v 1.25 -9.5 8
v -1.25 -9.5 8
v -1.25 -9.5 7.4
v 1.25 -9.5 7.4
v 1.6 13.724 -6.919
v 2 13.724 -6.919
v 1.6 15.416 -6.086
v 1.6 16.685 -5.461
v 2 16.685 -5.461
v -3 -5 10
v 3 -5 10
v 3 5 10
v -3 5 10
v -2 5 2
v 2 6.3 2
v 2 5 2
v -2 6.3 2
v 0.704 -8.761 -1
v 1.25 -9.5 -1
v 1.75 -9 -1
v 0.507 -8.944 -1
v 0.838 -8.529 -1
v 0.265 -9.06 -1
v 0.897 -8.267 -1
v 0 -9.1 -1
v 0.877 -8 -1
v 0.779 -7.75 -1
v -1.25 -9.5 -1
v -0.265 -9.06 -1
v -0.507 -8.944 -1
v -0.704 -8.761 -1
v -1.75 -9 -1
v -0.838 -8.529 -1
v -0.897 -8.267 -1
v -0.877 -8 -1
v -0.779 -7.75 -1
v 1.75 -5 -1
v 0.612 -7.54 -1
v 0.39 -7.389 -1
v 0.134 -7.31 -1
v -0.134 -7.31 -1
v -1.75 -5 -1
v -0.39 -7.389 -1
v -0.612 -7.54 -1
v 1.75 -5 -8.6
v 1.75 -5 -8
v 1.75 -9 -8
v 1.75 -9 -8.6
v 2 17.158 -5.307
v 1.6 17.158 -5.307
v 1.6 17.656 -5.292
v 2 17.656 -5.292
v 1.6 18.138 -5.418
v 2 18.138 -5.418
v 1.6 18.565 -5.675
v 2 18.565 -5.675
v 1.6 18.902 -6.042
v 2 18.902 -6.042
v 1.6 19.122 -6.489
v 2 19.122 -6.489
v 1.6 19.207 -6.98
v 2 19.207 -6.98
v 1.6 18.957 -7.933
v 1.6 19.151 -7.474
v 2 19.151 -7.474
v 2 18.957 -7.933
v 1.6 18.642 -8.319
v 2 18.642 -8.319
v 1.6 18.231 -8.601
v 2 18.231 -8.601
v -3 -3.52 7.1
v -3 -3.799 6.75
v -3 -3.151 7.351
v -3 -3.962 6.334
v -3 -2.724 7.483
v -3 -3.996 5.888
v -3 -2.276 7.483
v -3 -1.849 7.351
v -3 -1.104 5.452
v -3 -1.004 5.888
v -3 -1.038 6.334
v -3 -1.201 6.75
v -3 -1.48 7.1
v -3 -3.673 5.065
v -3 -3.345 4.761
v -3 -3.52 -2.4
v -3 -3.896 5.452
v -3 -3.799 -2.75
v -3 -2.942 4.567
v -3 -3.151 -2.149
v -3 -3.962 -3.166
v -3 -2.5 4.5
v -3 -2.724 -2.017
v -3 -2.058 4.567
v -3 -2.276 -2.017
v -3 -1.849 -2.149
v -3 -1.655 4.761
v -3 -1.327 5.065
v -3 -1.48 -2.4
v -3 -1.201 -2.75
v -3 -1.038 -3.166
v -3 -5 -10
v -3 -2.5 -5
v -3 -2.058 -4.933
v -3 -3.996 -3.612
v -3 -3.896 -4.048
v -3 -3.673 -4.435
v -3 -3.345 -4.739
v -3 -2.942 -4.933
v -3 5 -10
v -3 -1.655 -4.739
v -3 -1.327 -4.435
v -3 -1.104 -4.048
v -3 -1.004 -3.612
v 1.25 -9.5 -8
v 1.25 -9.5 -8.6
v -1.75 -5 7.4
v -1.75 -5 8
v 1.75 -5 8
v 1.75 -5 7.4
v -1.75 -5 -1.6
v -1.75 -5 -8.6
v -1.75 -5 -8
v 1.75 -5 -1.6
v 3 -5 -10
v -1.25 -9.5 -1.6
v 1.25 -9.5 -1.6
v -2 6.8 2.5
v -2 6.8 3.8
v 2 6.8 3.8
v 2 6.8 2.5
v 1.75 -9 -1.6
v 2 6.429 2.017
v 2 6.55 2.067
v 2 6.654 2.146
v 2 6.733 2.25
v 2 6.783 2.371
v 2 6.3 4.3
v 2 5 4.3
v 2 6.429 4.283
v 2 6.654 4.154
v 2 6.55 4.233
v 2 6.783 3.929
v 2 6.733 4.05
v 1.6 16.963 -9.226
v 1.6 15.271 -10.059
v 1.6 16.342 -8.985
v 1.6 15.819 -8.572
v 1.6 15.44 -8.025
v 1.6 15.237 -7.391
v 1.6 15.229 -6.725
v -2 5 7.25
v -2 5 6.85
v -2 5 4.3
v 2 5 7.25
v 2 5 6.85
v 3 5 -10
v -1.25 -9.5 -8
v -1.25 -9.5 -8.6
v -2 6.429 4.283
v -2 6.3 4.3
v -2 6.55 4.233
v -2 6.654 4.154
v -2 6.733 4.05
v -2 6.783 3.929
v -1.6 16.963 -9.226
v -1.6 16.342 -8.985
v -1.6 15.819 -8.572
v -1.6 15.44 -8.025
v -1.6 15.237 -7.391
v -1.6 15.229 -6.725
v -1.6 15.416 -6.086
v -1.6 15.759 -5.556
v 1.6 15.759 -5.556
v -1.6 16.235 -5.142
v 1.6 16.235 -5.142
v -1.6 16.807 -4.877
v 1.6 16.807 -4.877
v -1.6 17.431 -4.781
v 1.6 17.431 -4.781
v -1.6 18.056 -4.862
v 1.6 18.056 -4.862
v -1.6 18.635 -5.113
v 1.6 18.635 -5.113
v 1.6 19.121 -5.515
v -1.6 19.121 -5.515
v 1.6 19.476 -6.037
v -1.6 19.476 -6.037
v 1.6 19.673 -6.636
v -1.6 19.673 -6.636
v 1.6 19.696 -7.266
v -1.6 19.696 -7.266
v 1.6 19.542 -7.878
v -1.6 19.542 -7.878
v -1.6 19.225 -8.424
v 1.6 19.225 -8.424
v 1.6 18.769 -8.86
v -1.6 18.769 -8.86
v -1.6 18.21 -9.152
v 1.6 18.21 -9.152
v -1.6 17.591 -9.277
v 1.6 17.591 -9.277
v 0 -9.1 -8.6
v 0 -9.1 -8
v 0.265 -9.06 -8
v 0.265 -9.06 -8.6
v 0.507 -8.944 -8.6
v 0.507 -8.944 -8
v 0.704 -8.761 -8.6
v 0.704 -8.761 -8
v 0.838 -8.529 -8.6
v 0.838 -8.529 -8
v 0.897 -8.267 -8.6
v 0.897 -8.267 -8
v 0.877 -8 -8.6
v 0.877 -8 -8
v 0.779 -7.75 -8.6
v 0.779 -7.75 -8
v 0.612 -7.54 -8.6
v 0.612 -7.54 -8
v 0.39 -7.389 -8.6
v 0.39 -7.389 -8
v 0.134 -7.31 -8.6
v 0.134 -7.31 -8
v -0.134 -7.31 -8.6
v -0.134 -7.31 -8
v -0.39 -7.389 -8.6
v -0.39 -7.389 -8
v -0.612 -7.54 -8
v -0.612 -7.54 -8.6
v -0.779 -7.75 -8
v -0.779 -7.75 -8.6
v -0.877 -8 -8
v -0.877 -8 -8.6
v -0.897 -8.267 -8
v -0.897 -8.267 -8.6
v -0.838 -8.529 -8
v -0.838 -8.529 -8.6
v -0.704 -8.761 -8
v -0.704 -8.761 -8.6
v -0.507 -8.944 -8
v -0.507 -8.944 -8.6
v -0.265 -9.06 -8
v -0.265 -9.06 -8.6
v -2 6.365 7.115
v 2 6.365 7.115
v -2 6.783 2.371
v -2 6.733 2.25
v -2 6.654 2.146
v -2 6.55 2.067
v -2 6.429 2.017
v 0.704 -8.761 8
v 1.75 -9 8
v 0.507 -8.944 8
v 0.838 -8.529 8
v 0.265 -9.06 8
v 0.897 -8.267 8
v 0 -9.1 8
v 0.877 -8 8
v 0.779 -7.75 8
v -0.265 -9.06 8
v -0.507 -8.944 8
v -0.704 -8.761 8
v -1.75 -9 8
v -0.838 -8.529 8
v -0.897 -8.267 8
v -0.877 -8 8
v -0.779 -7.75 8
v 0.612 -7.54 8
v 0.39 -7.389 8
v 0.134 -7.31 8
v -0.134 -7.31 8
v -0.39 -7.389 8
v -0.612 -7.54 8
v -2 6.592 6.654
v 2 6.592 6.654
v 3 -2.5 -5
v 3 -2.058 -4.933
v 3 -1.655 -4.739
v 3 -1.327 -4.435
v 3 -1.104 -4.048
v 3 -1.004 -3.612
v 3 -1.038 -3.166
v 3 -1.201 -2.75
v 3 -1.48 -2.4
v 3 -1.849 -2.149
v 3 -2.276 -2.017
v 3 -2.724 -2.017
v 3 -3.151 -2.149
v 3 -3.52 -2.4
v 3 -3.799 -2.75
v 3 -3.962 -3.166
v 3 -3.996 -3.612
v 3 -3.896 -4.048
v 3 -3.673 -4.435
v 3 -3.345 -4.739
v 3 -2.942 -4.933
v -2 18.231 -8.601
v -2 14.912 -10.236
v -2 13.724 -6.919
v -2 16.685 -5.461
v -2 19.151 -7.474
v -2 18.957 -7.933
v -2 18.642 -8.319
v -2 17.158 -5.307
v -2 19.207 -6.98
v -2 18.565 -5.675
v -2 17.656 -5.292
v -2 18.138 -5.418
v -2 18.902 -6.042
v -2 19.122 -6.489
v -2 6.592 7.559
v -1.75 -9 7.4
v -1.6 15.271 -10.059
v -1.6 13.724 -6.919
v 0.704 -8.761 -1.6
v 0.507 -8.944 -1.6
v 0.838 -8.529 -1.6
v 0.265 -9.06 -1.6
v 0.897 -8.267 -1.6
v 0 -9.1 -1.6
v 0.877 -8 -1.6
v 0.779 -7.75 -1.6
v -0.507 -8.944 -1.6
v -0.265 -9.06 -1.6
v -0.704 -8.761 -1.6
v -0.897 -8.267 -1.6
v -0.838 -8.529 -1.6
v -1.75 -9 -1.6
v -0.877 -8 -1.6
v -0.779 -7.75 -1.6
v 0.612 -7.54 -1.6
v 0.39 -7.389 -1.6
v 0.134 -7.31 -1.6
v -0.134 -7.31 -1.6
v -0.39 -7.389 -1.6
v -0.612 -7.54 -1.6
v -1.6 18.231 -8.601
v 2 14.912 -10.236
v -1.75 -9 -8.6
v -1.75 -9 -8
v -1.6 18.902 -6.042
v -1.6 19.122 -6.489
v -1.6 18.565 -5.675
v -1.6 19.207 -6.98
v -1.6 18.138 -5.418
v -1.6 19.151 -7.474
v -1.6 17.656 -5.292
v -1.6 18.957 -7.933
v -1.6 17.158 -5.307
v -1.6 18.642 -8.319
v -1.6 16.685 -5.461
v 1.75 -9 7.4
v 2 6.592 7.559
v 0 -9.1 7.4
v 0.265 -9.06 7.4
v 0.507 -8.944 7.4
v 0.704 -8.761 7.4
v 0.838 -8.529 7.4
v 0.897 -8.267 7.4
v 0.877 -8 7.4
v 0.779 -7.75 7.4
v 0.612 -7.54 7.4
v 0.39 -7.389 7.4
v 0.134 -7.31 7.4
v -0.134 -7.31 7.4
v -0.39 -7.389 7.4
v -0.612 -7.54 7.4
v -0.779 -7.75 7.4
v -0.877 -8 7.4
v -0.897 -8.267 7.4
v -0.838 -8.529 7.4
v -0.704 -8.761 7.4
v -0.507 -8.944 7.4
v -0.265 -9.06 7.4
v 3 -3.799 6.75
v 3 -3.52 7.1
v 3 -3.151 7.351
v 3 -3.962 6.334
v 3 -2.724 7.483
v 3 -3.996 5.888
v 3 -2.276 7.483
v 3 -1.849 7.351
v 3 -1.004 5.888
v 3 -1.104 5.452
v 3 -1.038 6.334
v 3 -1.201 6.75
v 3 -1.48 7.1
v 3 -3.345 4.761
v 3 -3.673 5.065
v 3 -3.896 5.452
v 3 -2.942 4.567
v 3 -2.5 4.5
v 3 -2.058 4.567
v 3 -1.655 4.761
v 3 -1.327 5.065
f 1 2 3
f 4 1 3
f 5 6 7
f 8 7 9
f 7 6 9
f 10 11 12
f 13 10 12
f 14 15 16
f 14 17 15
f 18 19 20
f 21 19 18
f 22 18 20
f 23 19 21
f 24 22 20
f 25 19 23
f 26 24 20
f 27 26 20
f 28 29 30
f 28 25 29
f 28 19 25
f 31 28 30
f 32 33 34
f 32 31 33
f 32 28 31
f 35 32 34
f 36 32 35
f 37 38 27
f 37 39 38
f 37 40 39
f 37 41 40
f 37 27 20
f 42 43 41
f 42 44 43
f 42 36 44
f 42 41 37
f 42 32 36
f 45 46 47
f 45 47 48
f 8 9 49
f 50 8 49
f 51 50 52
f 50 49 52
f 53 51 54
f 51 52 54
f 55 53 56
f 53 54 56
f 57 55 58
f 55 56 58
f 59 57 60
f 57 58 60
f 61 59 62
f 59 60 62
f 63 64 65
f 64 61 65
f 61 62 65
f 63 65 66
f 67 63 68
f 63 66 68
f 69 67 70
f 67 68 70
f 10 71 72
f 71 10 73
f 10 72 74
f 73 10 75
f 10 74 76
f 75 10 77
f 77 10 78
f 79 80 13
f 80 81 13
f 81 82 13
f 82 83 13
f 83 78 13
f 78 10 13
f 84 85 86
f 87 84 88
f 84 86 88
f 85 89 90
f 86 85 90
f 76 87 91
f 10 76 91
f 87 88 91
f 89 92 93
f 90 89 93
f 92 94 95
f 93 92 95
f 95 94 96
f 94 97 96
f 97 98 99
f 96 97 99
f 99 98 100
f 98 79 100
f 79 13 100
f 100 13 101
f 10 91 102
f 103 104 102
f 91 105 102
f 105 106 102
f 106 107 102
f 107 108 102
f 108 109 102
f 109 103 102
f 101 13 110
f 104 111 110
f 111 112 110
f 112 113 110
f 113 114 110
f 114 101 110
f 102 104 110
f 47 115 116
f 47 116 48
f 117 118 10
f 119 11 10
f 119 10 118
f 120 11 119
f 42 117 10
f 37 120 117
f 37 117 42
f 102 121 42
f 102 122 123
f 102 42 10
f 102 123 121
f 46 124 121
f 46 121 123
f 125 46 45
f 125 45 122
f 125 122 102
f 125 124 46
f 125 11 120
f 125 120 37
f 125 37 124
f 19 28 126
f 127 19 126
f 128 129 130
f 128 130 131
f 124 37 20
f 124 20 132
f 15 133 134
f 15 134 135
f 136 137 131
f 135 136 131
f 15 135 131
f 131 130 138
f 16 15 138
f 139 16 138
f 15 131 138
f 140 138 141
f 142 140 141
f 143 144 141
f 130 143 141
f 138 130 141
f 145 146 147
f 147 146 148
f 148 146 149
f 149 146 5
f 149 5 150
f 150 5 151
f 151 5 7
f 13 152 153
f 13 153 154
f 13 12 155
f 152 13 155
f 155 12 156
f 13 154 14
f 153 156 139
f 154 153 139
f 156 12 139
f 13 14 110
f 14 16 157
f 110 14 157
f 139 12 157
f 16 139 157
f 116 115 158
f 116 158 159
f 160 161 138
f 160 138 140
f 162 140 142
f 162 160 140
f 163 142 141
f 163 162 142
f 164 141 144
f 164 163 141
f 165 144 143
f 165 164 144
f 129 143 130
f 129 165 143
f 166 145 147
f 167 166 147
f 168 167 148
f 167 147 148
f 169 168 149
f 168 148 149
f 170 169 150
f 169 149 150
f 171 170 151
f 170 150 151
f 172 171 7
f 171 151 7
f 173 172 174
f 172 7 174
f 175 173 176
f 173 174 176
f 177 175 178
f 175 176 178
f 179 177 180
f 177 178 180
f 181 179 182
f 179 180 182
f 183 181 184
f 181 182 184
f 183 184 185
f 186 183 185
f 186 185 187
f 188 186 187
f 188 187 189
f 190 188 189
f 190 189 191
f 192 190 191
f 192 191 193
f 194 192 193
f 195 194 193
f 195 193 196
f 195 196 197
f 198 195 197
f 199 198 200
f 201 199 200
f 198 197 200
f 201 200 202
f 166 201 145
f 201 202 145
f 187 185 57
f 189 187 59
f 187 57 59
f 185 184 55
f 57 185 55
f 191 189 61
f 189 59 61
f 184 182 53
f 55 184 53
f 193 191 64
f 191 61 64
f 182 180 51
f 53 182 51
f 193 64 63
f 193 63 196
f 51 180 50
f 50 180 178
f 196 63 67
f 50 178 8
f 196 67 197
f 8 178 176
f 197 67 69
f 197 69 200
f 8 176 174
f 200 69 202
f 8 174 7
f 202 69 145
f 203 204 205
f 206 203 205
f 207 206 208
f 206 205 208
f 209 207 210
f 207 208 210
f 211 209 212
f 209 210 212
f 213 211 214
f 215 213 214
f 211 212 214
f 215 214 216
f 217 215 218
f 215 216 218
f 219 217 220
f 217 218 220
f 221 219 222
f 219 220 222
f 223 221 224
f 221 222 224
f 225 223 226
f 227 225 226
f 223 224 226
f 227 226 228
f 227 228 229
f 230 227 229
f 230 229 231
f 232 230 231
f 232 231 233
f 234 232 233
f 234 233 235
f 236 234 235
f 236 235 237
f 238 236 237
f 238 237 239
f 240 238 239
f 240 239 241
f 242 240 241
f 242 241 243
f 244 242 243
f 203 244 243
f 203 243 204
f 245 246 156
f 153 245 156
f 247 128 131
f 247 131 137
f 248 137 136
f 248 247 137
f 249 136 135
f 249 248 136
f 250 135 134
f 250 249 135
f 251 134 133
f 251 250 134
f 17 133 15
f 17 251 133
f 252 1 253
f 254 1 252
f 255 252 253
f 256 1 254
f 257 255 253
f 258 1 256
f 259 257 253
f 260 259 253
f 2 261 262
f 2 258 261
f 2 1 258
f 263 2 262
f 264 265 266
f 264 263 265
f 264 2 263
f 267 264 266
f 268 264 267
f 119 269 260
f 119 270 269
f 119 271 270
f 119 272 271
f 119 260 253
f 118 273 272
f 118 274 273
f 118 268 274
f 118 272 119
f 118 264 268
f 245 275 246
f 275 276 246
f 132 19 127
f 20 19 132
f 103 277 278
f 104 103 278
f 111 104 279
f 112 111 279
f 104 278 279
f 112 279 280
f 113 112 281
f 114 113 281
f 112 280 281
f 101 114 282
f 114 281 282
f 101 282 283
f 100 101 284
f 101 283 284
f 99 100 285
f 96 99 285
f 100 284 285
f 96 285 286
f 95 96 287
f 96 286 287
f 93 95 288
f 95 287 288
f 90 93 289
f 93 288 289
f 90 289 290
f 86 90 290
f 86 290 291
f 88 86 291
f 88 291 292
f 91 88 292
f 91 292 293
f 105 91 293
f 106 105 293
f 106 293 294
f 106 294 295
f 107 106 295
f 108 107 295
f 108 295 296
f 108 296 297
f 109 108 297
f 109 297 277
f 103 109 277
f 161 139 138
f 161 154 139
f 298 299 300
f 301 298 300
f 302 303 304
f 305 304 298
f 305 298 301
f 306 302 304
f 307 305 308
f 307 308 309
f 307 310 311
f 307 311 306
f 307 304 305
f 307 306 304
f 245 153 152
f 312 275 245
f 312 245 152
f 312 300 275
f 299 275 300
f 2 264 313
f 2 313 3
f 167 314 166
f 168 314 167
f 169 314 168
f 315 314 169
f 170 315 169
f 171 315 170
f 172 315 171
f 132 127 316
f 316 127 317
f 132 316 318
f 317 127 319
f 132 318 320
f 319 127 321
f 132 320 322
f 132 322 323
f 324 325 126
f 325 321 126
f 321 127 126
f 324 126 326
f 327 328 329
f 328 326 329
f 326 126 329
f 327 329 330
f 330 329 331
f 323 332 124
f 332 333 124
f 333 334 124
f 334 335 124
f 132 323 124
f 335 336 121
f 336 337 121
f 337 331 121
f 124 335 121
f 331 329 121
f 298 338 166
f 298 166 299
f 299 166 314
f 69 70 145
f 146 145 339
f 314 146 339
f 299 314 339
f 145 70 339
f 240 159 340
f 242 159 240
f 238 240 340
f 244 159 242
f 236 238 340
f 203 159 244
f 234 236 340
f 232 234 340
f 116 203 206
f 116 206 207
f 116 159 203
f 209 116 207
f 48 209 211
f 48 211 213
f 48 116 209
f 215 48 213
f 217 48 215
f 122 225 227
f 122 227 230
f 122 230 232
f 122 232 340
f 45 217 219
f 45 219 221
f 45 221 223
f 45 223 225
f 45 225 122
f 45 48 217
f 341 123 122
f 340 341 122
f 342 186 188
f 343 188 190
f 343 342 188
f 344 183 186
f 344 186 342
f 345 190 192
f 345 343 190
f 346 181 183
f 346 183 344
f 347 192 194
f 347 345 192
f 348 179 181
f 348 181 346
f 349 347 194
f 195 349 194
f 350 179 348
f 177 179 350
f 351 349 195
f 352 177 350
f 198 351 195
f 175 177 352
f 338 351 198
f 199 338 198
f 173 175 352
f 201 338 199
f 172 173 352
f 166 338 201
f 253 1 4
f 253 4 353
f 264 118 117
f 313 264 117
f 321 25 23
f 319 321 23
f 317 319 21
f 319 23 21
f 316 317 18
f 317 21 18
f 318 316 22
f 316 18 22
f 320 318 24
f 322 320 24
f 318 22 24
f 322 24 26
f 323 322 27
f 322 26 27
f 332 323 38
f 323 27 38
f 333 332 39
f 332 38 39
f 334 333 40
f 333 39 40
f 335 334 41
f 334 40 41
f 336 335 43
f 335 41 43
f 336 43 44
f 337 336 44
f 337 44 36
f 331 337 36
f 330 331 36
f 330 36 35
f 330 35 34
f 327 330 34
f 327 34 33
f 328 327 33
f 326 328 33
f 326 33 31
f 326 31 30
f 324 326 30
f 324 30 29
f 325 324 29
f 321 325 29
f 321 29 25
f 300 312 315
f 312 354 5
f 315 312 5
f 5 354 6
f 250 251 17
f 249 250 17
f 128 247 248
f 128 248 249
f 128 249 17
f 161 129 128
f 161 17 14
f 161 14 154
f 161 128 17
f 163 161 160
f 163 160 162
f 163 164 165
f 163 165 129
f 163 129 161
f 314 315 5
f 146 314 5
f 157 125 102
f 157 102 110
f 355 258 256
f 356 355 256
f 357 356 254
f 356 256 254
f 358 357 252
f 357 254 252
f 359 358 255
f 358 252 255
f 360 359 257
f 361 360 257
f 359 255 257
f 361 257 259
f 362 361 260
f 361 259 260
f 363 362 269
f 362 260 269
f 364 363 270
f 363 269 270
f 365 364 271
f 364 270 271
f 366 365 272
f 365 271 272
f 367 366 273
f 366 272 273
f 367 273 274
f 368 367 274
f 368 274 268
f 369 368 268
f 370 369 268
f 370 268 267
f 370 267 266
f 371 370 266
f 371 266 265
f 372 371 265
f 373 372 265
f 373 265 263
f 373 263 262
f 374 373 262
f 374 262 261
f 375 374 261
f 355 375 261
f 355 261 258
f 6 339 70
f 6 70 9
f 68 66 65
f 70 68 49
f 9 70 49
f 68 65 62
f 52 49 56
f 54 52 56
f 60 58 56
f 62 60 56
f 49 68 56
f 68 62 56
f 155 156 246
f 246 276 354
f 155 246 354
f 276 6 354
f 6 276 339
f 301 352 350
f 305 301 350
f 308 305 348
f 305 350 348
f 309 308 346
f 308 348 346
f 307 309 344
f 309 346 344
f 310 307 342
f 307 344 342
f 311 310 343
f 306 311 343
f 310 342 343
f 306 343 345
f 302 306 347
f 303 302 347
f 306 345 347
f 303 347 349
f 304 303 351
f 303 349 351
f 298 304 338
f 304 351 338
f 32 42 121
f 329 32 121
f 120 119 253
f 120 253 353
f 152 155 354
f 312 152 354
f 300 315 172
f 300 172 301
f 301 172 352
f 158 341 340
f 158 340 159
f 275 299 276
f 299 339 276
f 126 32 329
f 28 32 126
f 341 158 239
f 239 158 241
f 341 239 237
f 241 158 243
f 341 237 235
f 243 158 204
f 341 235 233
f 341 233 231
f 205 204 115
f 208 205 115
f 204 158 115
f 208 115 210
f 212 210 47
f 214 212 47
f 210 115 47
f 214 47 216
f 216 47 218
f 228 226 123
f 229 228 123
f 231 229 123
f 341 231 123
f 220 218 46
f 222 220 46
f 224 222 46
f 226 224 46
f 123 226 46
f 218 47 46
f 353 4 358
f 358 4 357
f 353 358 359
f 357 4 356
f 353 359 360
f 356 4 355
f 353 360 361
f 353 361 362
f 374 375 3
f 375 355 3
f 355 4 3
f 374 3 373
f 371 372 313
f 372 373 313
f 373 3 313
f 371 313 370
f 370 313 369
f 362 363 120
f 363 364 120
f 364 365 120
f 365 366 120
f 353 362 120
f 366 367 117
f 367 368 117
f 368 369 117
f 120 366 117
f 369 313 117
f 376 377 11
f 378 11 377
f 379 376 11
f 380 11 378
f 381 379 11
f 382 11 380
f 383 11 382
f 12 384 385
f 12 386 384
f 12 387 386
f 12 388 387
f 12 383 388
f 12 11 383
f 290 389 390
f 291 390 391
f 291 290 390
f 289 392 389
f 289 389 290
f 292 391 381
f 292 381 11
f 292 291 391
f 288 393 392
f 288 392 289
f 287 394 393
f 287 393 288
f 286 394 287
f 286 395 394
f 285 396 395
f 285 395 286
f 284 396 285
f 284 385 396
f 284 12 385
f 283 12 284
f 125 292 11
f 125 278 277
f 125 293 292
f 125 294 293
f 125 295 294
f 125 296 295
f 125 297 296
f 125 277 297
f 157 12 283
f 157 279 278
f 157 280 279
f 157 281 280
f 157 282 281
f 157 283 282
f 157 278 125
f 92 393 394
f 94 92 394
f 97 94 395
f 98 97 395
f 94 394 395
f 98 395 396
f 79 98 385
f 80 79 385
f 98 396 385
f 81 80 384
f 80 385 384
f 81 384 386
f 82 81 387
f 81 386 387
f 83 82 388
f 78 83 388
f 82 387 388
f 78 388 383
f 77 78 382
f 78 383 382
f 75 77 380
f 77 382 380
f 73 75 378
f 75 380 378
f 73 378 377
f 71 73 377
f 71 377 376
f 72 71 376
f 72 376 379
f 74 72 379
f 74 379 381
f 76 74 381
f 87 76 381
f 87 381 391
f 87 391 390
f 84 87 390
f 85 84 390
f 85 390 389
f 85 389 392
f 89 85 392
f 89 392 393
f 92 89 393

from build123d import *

# Parameters (mm, degrees)
CROQUIS2_W              = 20
CROQUIS2_H              = 10
SALIENTE_EXTRUIR1_DEPTH = 3
SALIENTE_EXTRUIR2_DEPTH = 2
CROQUIS4_W              = 3.2
CROQUIS4_H              = 5.473345926
CORTAR_EXTRUIR1_DEPTH   = 4
CROQUIS5_R              = 2.25
SALIENTE_EXTRUIR3_DEPTH = 3.2
CROQUIS6_R              = 1.5
CORTAR_EXTRUIR2_DEPTH   = 24.003733896
CROQUIS7_W              = 0.6
CROQUIS7_H              = 4.5
SALIENTE_EXTRUIR4_DEPTH = 1.75
CROQUIS8_R              = 0.9
CORTAR_EXTRUIR3_DEPTH   = 28.017462518


with BuildPart() as part:
    # Croquis2 → Saliente-Extruir1 (new, symmetric)
    with BuildSketch(Plane(origin=(0, 0, 0), x_dir=(0, 0, -1), z_dir=(1, 0, 0))):
        Rectangle(CROQUIS2_W, CROQUIS2_H)
    extrude(amount=SALIENTE_EXTRUIR1_DEPTH, both=True)

    # Croquis3 → Saliente-Extruir2 (add, symmetric)
    with BuildSketch(Plane(origin=(0, 0, 0), x_dir=(0, 0, -1), z_dir=(1, 0, 0))):
        with BuildLine():
            Line((-4.3, 5), (-4.3, 6.3))
            ThreePointArc((-4.3, 6.3), (-4.153553391, 6.653553391), (-3.8, 6.8))
            Line((-3.8, 6.8), (-2.5, 6.8))
            ThreePointArc((-2.5, 6.8), (-2.146446609, 6.653553391), (-2, 6.3))
            Line((-2, 6.3), (-2, 5))
            Line((-2, 5), (-4.3, 5))
        make_face()
        with BuildLine():
            Line((-7.25, 5), (-7.559492191, 6.592199292))
            Line((-7.559492191, 6.592199292), (6.919218672, 13.724276953))
            Line((6.919218672, 13.724276953), (5.46098718, 16.68460817))
            ThreePointArc((5.46098718, 16.68460817), (6.257555216, 19.027785364), (8.60073241, 18.231217328))
            Line((8.60073241, 18.231217328), (10.235719234, 14.912058085))
            Line((10.235719234, 14.912058085), (-6.654286119, 6.592199292))
            Line((-6.654286119, 6.592199292), (-7.115345765, 6.365085619))
            Line((-7.115345765, 6.365085619), (-6.85, 5))
            Line((-6.85, 5), (-7.25, 5))
        make_face()
    extrude(amount=SALIENTE_EXTRUIR2_DEPTH, both=True)

    # Croquis4 → Cortar-Extruir1 (cut)
    with BuildSketch(Plane(origin=(0, 5.422686469, -11.008504563), x_dir=(1, 0, 0), z_dir=(0, -0.4418883309364162, 0.8970700658155017))):
        with Locations((0, 11.990789002)):
            Rectangle(CROQUIS4_W, CROQUIS4_H)
    extrude(amount=-CORTAR_EXTRUIR1_DEPTH, mode=Mode.SUBTRACT)

    # Croquis5 → Saliente-Extruir3 (add)
    with BuildSketch(Plane.ZY.offset(-1.6)):
        with Locations((-7.030859795, 17.457912749)):
            Circle(CROQUIS5_R)
    extrude(amount=SALIENTE_EXTRUIR3_DEPTH)

    # Croquis6 → Cortar-Extruir2 (cut, through all)
    with BuildSketch(Plane(origin=(3, 0, 0), x_dir=(0, 0, -1), z_dir=(1, 0, 0))):
        with Locations((-6, -2.5)):
            Circle(CROQUIS6_R)
        with Locations((3.5, -2.5)):
            Circle(CROQUIS6_R)
    extrude(amount=-CORTAR_EXTRUIR2_DEPTH, mode=Mode.SUBTRACT)

    # Croquis7 → Saliente-Extruir4 (add, symmetric)
    with BuildSketch(Plane(origin=(0, 0, 0), x_dir=(0, 0, -1), z_dir=(1, 0, 0))):
        with Locations((-7.7, -7.25)):
            Rectangle(CROQUIS7_W, CROQUIS7_H)
        with Locations((1.3, -7.25)):
            Rectangle(CROQUIS7_W, CROQUIS7_H)
        with Locations((8.3, -7.25)):
            Rectangle(CROQUIS7_W, CROQUIS7_H)
    extrude(amount=SALIENTE_EXTRUIR4_DEPTH, both=True)

    # Croquis8 → Cortar-Extruir3 (cut, through all)
    with BuildSketch(Plane.XY.offset(8)):
        with Locations((0, -8.2)):
            Circle(CROQUIS8_R)
        Polygon((-1.75, -9), (-1.25, -9.5), (-1.75, -9.5), align=None)
        Polygon((1.25, -9.5), (1.75, -9), (1.75, -9.5), align=None)
    extrude(amount=-CORTAR_EXTRUIR3_DEPTH, mode=Mode.SUBTRACT)


solid = part.part
